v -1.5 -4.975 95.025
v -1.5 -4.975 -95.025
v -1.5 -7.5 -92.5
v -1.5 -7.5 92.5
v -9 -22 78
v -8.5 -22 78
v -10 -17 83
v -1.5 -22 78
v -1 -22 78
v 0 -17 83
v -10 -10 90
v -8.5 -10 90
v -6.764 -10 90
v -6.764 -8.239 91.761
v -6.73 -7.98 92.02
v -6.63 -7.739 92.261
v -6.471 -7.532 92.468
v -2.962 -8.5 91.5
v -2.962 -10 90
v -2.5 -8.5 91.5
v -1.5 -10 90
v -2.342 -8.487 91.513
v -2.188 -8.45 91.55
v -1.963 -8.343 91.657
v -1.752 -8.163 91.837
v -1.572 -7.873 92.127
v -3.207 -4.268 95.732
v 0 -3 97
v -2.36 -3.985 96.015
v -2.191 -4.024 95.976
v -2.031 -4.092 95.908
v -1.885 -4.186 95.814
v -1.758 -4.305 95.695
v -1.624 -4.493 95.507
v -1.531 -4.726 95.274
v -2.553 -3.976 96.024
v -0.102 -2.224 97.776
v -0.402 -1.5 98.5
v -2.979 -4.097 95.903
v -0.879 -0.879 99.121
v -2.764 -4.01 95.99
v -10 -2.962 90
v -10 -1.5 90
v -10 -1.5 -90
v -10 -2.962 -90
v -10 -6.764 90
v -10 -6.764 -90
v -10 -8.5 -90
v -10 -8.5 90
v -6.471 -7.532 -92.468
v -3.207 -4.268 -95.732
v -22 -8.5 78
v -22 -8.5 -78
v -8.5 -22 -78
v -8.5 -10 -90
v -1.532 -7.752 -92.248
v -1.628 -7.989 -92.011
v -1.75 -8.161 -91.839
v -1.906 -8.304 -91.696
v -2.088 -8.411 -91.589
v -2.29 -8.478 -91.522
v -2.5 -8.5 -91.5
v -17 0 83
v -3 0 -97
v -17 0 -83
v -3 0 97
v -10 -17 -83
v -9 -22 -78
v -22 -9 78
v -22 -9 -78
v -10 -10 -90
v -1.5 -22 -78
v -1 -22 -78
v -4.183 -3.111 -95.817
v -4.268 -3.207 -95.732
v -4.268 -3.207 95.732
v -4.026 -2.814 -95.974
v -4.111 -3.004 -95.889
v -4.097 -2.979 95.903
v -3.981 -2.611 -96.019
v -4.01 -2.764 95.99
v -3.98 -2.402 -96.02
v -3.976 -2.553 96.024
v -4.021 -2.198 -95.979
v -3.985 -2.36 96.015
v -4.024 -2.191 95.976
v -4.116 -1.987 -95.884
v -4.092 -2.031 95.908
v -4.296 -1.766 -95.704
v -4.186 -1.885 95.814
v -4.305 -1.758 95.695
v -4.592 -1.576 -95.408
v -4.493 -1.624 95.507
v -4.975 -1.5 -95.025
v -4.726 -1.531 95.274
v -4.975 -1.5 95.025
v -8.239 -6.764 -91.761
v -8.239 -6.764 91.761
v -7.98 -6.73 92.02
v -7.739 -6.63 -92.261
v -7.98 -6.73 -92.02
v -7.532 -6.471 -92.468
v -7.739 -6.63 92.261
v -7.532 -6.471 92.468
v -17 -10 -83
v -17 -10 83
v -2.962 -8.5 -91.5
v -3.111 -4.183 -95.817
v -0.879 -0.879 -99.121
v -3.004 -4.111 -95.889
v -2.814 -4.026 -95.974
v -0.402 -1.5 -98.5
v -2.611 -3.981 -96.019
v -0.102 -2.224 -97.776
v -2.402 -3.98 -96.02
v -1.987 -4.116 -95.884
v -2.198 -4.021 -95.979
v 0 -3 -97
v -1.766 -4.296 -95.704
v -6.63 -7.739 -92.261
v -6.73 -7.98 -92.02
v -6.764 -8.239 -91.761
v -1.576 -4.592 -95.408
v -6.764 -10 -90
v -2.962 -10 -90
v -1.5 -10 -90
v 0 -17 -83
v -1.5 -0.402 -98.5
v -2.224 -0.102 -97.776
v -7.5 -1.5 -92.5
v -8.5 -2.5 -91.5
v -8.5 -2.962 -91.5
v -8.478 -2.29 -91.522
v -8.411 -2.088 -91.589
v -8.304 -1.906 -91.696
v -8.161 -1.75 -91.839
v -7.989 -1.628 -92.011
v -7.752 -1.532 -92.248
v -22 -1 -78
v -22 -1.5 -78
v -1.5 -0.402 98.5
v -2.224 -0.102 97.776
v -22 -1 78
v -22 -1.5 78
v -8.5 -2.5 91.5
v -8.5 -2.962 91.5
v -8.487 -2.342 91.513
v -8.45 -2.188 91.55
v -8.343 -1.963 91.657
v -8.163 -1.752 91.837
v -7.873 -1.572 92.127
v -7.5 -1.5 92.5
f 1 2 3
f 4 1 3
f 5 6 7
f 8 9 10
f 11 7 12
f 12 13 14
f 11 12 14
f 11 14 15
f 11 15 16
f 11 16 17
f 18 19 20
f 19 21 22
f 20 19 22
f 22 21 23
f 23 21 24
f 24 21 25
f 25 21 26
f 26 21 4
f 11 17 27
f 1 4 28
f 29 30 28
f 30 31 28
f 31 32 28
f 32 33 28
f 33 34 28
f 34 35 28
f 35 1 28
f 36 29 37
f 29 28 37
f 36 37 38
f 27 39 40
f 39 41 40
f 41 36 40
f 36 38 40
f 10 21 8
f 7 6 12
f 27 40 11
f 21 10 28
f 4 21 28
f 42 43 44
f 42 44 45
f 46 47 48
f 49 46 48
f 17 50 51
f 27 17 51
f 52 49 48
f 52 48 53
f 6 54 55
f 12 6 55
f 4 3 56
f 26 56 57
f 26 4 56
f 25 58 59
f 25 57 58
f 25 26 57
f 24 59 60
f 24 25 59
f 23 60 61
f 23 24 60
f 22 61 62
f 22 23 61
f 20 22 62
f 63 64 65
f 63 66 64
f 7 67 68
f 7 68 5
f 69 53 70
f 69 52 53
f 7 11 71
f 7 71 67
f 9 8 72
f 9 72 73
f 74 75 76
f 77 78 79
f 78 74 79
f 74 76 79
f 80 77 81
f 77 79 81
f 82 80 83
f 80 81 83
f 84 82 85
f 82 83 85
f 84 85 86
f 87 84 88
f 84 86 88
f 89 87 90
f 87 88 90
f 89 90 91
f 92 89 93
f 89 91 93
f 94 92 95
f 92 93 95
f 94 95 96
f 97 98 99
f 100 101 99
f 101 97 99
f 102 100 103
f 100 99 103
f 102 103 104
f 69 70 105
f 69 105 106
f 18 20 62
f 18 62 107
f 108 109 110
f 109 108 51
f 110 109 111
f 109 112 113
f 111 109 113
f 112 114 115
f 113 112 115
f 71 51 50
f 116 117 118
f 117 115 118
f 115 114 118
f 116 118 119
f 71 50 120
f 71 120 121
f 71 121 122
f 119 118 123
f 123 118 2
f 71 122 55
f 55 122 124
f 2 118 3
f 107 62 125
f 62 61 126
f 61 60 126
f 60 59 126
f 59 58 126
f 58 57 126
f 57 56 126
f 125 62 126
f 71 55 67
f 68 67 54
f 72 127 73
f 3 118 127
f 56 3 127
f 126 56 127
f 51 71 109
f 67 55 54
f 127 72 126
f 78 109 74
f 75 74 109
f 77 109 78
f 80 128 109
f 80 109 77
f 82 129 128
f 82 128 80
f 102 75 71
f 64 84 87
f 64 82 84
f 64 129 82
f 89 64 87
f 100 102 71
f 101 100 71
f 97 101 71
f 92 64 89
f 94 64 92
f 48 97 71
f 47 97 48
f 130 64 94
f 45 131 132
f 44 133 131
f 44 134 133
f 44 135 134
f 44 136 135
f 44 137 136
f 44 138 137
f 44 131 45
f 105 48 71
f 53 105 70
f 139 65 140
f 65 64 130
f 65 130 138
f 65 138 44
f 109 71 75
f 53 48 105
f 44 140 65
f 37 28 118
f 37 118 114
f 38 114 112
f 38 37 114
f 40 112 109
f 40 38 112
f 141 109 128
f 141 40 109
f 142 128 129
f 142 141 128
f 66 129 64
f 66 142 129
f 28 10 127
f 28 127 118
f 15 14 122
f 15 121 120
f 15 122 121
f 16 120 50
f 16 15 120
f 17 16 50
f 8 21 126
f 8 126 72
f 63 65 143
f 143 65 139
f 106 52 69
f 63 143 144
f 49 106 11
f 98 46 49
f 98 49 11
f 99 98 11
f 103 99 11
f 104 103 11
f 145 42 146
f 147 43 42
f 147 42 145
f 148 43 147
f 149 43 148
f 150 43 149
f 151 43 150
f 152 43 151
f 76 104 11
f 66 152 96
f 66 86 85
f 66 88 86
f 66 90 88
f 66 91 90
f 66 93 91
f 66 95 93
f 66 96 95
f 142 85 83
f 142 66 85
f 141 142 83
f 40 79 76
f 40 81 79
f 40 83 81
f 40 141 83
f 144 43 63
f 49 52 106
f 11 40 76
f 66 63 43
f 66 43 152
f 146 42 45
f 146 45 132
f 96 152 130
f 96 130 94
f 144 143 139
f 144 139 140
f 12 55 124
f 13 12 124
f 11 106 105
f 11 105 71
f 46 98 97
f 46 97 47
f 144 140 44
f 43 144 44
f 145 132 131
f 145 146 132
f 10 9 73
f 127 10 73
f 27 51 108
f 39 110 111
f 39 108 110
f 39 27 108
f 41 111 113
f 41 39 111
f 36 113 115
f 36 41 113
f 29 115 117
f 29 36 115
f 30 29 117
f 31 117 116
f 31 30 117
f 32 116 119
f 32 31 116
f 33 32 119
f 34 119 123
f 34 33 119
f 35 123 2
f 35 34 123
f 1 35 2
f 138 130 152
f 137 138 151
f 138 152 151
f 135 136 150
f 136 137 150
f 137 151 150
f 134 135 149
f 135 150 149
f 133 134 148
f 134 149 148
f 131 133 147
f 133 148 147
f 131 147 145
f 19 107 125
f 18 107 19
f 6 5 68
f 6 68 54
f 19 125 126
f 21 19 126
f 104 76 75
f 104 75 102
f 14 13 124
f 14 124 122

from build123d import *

# Parameters (mm, degrees)
F1_DEPTH   = 100
F2_SIZE2   = 1
F2_SIZE    = 5
F2_2_SIZE2 = 1
F2_2_SIZE  = 5
F3_SIZE2   = 5
F3_SIZE    = 1
F3_2_SIZE2 = 5
F3_2_SIZE  = 1
F4_R       = 1
F7_DEPTH   = 25
F8_DEPTH   = 25


with BuildPart() as f1:
    # F0 (on Top) → F1 (new body, symmetric)
    with BuildSketch(Plane.XY):
        with BuildLine():
            Line((-3, 0), (-22, 0))
            Line((-22, 0), (-22, -1.5))
            Line((-22, -1.5), (-10, -1.5))
            Line((-10, -1.5), (-10, -2.9619401321))
            Line((-10, -2.9619401321), (-8.5, -2.9619401321))
            Line((-8.5, -2.9619401321), (-8.5, -1.5))
            Line((-8.5, -1.5), (-2.5606601718, -1.5))
            Line((-2.5606601718, -1.5), (-7.8245233162, -6.7638631444))
            Line((-7.8245233162, -6.7638631444), (-10, -6.7638631444))
            Line((-10, -6.7638631444), (-10, -8.5))
            Line((-10, -8.5), (-22, -8.5))
            Line((-22, -8.5), (-22, -10))
            Line((-22, -10), (-10, -10))
            Line((-10, -10), (-10, -22))
            Line((-10, -22), (-8.5, -22))
            Line((-8.5, -22), (-8.5, -10))
            Line((-8.5, -10), (-6.7638631444, -10))
            Line((-6.7638631444, -10), (-6.7638631444, -7.8245233162))
            Line((-6.7638631444, -7.8245233162), (-1.5, -2.5606601718))
            Line((-1.5, -2.5606601718), (-1.5, -8.5))
            Line((-1.5, -8.5), (-2.9619401321, -8.5))
            Line((-2.9619401321, -8.5), (-2.9619401321, -10))
            Line((-2.9619401321, -10), (-1.5, -10))
            Line((-1.5, -10), (-1.5, -22))
            Line((-1.5, -22), (0, -22))
            Line((0, -22), (0, -3))
            ThreePointArc((0, -3), (-0.8786796564, -0.8786796564), (-3, 0))
        make_face()
    extrude(amount=F1_DEPTH, both=True)

    # F2
    f2_edges = [f1.edges().sort_by_distance(p)[0] for p in [
        (-22, -10, 0),
    ]]
    f2_side = f1.faces().sort_by_distance((-16, -10, 0))[0]
    chamfer(f2_edges, length=F2_SIZE, length2=F2_SIZE2, reference=f2_side)

    # F2#2
    f2_2_edges = [f1.edges().sort_by_distance(p)[0] for p in [
        (0, -22, 0),
    ]]
    f2_2_side = f1.faces().sort_by_distance((0, -12.5, 0))[0]
    chamfer(f2_2_edges, length=F2_2_SIZE, length2=F2_2_SIZE2, reference=f2_2_side)

    # F3
    f3_edges = [f1.edges().sort_by_distance(p)[0] for p in [
        (-22, 0, 0),
    ]]
    f3_side = f1.faces().sort_by_distance((-22, -0.75, 0))[0]
    chamfer(f3_edges, length=F3_SIZE, length2=F3_SIZE2, reference=f3_side)

    # F3#2
    f3_2_edges = [f1.edges().sort_by_distance(p)[0] for p in [
        (-10, -22, 0),
    ]]
    f3_2_side = f1.faces().sort_by_distance((-9.25, -22, 0))[0]
    chamfer(f3_2_edges, length=F3_2_SIZE, length2=F3_2_SIZE2, reference=f3_2_side)

    # F4
    f4_edges = [f1.edges().sort_by_distance(p)[0] for p in [
        (-2.56066, -1.5, 0),
        (-1.5, -2.56066, 0),
        (-6.763863, -7.824523, 0),
        (-7.824523, -6.763863, 0),
        (-1.5, -8.5, 0),
        (-8.5, -1.5, 0),
    ]]
    fillet(f4_edges, radius=F4_R)

    # F5 (on Front) → F7 (cut)
    with BuildSketch(Plane.XZ):
        Polygon((0, 100), (-22, 100), (-22, 78), align=None)
        Polygon((-22, -78), (-22, -100), (0, -100), align=None)
    extrude(amount=F7_DEPTH, mode=Mode.SUBTRACT)

    # F6 (on Right) → F8 (cut)
    with BuildSketch(Plane.YZ):
        Polygon((-22, 78), (0, 100), (-22, 100), align=None)
        Polygon((-22, -100), (0, -100), (-22, -78), align=None)
    extrude(amount=-F8_DEPTH, mode=Mode.SUBTRACT)


solid = f1.part
